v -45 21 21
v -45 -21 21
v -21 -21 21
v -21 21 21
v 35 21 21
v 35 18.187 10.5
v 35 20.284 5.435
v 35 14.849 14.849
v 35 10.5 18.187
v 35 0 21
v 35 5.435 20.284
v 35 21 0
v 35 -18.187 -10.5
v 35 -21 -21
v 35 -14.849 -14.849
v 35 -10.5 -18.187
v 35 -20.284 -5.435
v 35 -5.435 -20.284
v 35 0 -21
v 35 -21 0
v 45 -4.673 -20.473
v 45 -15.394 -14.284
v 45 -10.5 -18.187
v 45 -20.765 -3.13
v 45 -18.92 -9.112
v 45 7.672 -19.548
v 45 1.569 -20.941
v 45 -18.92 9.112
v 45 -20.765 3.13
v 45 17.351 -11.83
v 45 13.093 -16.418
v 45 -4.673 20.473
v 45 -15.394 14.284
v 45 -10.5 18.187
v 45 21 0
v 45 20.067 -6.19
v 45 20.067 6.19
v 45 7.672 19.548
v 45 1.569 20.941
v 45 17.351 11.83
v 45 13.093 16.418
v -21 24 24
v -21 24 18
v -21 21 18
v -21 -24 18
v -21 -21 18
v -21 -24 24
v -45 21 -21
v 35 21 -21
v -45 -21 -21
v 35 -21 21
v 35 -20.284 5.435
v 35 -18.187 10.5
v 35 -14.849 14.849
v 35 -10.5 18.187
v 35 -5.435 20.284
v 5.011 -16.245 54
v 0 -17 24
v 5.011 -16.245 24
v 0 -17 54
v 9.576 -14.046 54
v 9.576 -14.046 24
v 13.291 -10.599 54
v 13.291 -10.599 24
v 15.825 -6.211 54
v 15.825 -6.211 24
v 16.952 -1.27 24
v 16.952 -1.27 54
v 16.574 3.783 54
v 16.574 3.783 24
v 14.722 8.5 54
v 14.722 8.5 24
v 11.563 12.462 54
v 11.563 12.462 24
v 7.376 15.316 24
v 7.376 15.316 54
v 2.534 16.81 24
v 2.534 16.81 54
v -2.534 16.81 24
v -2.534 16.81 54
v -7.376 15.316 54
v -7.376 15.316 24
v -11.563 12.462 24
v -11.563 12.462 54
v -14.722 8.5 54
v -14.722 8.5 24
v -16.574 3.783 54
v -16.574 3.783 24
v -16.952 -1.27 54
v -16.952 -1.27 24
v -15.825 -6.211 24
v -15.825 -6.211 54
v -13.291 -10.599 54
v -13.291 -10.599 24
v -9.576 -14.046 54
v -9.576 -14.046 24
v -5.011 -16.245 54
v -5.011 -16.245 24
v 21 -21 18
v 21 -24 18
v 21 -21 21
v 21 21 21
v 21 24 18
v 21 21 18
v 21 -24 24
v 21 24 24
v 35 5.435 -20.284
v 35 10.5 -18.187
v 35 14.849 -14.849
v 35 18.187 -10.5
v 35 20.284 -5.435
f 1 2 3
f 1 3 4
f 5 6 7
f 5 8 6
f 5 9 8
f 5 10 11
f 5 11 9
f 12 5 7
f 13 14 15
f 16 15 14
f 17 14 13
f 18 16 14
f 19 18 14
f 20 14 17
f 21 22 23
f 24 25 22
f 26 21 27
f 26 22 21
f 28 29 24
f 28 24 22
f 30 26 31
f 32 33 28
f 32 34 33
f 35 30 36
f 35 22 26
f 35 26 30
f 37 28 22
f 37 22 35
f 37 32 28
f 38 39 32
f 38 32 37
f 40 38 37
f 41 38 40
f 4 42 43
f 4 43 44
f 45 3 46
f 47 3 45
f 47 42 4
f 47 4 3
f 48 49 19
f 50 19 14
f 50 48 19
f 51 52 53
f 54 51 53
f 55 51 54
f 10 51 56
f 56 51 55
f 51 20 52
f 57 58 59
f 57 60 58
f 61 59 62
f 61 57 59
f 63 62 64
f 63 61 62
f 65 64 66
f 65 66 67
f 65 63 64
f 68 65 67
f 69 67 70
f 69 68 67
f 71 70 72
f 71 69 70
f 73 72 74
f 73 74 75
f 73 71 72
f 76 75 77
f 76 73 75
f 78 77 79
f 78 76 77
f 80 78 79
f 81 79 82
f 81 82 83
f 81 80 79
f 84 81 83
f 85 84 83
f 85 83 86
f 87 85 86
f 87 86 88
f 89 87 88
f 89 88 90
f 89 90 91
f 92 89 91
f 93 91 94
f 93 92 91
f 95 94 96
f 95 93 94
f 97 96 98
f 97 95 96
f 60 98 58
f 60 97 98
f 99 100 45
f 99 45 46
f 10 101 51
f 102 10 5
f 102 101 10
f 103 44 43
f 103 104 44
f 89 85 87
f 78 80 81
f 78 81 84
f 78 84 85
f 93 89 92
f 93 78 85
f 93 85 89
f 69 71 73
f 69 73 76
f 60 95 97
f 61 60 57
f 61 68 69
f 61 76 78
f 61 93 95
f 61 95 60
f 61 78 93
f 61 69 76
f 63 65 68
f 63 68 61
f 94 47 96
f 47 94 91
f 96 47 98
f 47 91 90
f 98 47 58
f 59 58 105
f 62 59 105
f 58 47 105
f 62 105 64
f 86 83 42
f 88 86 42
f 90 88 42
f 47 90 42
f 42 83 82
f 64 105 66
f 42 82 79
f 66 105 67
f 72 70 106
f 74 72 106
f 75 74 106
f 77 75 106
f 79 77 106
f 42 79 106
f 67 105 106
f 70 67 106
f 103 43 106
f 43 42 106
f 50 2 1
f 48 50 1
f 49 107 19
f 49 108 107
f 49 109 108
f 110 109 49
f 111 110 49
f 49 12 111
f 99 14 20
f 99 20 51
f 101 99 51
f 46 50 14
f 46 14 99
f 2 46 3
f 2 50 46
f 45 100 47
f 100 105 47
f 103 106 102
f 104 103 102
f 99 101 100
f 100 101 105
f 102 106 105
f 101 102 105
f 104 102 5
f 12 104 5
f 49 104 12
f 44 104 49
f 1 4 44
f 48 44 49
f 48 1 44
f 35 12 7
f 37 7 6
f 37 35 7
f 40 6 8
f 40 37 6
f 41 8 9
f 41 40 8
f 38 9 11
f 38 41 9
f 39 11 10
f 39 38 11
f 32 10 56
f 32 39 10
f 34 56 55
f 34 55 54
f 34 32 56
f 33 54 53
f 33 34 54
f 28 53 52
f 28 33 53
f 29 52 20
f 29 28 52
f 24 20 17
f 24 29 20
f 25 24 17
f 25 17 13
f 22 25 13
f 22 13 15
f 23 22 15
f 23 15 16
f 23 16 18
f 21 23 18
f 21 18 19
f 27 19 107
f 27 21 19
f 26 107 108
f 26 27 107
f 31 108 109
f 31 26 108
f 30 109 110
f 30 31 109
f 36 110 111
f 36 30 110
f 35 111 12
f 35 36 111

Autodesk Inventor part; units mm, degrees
ref_plane "YZ Plane" through (0, 0, 0) normal (1, 0, 0) x (0, 1, 0)
ref_plane "XZ Plane" through (0, 0, 0) normal (0, 1, 0) x (-1, 0, 0)
ref_plane "XY Plane" through (0, 0, 0) normal (0, 0, 1) x (1, 0, 0)
sketch "Sketch1" plane through (0, 0, 0) normal (0, 1, 0) x (-1, 0, 0)
  circle A0 centre (0, 0) radius 17
  dimension "d0" = 34
extrude "Extrusion1" add sketch "Sketch1" against normal blind 30
sketch "Sketch2" plane through (0, -30, 0) normal (0, -1, 0) x (1, 0, 0)
  circle A0 centre (0, 0) radius 17 projected
  line L0 (0, 0) -> (0, -21) construction
  line L1 (0, 0) -> (-24, 0) construction
  line L2 (0, -21) -> (-24, -21)
  line L3 (-24, 0) -> (-24, -21)
  line L4 (0, -21) -> (24, -21)
  line L5 (24, 0) -> (24, -21)
  line L6 (0, 21) -> (-24, 21)
  line L7 (-24, 0) -> (-24, 21)
  line L8 (0, 21) -> (24, 21)
  line L9 (24, 0) -> (24, 21)
  dimension "d5" = 21
  dimension "d6" = 24
extrude "Extrusion2" add sketch "Sketch2" along normal blind 6 contours A0 | L2 L3 L7 L6 L8 L9 L5 L4
sketch "Sketch3" plane through (-24, -30, 21) normal (0, 0, 1) x (1, 0, 0)
  line L0 (0, 0) -> (48, 0) projected
  line L1 (48, -6) -> (0, -6) projected
  line L2 (3, -6) -> (45, -6)
  line L3 (45, -6) -> (45, -3)
  line L4 (45, -3) -> (3, -3)
  line L5 (3, -3) -> (3, -6)
  line L6 (24, 0) -> (24, -6) construction
  line L7 (24, -3) -> (24, -6) construction
  point P0 (24, 30)
  dimension "d9" = 3
  dimension "d11" = 42
extrude "Extrusion3" cut sketch "Sketch3" against normal through all
sketch "Sketch4" plane through (0, 0, 0) normal (0, 0, 1) x (1, 0, 0)
  line L0 (-21, -33) -> (21, -33)
  line L1 (21, -33) -> (21, -75)
  line L2 (21, -75) -> (-21, -75)
  line L3 (-21, -75) -> (-21, -33)
  line L4 (-21, -36) -> (-21, -33) projected
  line L5 (-21, -33) -> (21, -33) projected
  line L6 (21, -33) -> (21, -36) projected
  point P0 (0, 0)
extrude "Extrusion4" add sketch "Sketch4" along normal mid plane 90
sketch "Sketch5" plane through (0, 0, 45) normal (0, 0, 1) x (1, 0, 0)
  line L0 (21, -33) -> (-21, -33) projected
  line L1 (-21, -33) -> (-21, -75) projected
  line L2 (-21, -75) -> (21, -75) projected
  line L3 (21, -75) -> (21, -33) projected
  line L4 (-21, -33) -> (21, -75) construction
  circle A0 centre (0, -54) radius 21
  point P0 (0, 0)
extrude "Extrusion5" cut sketch "Sketch5" against normal blind 10 contours L3 A0 L0 | A0 L1 L0 | L3 L2 A0 | A0 L2 L1
move or copy body "Move Body1" bodies to move or copy 1 copy no rotation origin (0, 0, 0) rotation axis (1, 0, 0) rotation angle 90
move or copy body "Move Body2" bodies to move or copy 1 copy no rotation origin (0, 0, 0) rotation axis (0, 0, 1) rotation angle 90
move or copy body "Move Body3" bodies to move or copy 1 copy no translate (0, 0, 54)
properties part number "Wrist_Yaw"
